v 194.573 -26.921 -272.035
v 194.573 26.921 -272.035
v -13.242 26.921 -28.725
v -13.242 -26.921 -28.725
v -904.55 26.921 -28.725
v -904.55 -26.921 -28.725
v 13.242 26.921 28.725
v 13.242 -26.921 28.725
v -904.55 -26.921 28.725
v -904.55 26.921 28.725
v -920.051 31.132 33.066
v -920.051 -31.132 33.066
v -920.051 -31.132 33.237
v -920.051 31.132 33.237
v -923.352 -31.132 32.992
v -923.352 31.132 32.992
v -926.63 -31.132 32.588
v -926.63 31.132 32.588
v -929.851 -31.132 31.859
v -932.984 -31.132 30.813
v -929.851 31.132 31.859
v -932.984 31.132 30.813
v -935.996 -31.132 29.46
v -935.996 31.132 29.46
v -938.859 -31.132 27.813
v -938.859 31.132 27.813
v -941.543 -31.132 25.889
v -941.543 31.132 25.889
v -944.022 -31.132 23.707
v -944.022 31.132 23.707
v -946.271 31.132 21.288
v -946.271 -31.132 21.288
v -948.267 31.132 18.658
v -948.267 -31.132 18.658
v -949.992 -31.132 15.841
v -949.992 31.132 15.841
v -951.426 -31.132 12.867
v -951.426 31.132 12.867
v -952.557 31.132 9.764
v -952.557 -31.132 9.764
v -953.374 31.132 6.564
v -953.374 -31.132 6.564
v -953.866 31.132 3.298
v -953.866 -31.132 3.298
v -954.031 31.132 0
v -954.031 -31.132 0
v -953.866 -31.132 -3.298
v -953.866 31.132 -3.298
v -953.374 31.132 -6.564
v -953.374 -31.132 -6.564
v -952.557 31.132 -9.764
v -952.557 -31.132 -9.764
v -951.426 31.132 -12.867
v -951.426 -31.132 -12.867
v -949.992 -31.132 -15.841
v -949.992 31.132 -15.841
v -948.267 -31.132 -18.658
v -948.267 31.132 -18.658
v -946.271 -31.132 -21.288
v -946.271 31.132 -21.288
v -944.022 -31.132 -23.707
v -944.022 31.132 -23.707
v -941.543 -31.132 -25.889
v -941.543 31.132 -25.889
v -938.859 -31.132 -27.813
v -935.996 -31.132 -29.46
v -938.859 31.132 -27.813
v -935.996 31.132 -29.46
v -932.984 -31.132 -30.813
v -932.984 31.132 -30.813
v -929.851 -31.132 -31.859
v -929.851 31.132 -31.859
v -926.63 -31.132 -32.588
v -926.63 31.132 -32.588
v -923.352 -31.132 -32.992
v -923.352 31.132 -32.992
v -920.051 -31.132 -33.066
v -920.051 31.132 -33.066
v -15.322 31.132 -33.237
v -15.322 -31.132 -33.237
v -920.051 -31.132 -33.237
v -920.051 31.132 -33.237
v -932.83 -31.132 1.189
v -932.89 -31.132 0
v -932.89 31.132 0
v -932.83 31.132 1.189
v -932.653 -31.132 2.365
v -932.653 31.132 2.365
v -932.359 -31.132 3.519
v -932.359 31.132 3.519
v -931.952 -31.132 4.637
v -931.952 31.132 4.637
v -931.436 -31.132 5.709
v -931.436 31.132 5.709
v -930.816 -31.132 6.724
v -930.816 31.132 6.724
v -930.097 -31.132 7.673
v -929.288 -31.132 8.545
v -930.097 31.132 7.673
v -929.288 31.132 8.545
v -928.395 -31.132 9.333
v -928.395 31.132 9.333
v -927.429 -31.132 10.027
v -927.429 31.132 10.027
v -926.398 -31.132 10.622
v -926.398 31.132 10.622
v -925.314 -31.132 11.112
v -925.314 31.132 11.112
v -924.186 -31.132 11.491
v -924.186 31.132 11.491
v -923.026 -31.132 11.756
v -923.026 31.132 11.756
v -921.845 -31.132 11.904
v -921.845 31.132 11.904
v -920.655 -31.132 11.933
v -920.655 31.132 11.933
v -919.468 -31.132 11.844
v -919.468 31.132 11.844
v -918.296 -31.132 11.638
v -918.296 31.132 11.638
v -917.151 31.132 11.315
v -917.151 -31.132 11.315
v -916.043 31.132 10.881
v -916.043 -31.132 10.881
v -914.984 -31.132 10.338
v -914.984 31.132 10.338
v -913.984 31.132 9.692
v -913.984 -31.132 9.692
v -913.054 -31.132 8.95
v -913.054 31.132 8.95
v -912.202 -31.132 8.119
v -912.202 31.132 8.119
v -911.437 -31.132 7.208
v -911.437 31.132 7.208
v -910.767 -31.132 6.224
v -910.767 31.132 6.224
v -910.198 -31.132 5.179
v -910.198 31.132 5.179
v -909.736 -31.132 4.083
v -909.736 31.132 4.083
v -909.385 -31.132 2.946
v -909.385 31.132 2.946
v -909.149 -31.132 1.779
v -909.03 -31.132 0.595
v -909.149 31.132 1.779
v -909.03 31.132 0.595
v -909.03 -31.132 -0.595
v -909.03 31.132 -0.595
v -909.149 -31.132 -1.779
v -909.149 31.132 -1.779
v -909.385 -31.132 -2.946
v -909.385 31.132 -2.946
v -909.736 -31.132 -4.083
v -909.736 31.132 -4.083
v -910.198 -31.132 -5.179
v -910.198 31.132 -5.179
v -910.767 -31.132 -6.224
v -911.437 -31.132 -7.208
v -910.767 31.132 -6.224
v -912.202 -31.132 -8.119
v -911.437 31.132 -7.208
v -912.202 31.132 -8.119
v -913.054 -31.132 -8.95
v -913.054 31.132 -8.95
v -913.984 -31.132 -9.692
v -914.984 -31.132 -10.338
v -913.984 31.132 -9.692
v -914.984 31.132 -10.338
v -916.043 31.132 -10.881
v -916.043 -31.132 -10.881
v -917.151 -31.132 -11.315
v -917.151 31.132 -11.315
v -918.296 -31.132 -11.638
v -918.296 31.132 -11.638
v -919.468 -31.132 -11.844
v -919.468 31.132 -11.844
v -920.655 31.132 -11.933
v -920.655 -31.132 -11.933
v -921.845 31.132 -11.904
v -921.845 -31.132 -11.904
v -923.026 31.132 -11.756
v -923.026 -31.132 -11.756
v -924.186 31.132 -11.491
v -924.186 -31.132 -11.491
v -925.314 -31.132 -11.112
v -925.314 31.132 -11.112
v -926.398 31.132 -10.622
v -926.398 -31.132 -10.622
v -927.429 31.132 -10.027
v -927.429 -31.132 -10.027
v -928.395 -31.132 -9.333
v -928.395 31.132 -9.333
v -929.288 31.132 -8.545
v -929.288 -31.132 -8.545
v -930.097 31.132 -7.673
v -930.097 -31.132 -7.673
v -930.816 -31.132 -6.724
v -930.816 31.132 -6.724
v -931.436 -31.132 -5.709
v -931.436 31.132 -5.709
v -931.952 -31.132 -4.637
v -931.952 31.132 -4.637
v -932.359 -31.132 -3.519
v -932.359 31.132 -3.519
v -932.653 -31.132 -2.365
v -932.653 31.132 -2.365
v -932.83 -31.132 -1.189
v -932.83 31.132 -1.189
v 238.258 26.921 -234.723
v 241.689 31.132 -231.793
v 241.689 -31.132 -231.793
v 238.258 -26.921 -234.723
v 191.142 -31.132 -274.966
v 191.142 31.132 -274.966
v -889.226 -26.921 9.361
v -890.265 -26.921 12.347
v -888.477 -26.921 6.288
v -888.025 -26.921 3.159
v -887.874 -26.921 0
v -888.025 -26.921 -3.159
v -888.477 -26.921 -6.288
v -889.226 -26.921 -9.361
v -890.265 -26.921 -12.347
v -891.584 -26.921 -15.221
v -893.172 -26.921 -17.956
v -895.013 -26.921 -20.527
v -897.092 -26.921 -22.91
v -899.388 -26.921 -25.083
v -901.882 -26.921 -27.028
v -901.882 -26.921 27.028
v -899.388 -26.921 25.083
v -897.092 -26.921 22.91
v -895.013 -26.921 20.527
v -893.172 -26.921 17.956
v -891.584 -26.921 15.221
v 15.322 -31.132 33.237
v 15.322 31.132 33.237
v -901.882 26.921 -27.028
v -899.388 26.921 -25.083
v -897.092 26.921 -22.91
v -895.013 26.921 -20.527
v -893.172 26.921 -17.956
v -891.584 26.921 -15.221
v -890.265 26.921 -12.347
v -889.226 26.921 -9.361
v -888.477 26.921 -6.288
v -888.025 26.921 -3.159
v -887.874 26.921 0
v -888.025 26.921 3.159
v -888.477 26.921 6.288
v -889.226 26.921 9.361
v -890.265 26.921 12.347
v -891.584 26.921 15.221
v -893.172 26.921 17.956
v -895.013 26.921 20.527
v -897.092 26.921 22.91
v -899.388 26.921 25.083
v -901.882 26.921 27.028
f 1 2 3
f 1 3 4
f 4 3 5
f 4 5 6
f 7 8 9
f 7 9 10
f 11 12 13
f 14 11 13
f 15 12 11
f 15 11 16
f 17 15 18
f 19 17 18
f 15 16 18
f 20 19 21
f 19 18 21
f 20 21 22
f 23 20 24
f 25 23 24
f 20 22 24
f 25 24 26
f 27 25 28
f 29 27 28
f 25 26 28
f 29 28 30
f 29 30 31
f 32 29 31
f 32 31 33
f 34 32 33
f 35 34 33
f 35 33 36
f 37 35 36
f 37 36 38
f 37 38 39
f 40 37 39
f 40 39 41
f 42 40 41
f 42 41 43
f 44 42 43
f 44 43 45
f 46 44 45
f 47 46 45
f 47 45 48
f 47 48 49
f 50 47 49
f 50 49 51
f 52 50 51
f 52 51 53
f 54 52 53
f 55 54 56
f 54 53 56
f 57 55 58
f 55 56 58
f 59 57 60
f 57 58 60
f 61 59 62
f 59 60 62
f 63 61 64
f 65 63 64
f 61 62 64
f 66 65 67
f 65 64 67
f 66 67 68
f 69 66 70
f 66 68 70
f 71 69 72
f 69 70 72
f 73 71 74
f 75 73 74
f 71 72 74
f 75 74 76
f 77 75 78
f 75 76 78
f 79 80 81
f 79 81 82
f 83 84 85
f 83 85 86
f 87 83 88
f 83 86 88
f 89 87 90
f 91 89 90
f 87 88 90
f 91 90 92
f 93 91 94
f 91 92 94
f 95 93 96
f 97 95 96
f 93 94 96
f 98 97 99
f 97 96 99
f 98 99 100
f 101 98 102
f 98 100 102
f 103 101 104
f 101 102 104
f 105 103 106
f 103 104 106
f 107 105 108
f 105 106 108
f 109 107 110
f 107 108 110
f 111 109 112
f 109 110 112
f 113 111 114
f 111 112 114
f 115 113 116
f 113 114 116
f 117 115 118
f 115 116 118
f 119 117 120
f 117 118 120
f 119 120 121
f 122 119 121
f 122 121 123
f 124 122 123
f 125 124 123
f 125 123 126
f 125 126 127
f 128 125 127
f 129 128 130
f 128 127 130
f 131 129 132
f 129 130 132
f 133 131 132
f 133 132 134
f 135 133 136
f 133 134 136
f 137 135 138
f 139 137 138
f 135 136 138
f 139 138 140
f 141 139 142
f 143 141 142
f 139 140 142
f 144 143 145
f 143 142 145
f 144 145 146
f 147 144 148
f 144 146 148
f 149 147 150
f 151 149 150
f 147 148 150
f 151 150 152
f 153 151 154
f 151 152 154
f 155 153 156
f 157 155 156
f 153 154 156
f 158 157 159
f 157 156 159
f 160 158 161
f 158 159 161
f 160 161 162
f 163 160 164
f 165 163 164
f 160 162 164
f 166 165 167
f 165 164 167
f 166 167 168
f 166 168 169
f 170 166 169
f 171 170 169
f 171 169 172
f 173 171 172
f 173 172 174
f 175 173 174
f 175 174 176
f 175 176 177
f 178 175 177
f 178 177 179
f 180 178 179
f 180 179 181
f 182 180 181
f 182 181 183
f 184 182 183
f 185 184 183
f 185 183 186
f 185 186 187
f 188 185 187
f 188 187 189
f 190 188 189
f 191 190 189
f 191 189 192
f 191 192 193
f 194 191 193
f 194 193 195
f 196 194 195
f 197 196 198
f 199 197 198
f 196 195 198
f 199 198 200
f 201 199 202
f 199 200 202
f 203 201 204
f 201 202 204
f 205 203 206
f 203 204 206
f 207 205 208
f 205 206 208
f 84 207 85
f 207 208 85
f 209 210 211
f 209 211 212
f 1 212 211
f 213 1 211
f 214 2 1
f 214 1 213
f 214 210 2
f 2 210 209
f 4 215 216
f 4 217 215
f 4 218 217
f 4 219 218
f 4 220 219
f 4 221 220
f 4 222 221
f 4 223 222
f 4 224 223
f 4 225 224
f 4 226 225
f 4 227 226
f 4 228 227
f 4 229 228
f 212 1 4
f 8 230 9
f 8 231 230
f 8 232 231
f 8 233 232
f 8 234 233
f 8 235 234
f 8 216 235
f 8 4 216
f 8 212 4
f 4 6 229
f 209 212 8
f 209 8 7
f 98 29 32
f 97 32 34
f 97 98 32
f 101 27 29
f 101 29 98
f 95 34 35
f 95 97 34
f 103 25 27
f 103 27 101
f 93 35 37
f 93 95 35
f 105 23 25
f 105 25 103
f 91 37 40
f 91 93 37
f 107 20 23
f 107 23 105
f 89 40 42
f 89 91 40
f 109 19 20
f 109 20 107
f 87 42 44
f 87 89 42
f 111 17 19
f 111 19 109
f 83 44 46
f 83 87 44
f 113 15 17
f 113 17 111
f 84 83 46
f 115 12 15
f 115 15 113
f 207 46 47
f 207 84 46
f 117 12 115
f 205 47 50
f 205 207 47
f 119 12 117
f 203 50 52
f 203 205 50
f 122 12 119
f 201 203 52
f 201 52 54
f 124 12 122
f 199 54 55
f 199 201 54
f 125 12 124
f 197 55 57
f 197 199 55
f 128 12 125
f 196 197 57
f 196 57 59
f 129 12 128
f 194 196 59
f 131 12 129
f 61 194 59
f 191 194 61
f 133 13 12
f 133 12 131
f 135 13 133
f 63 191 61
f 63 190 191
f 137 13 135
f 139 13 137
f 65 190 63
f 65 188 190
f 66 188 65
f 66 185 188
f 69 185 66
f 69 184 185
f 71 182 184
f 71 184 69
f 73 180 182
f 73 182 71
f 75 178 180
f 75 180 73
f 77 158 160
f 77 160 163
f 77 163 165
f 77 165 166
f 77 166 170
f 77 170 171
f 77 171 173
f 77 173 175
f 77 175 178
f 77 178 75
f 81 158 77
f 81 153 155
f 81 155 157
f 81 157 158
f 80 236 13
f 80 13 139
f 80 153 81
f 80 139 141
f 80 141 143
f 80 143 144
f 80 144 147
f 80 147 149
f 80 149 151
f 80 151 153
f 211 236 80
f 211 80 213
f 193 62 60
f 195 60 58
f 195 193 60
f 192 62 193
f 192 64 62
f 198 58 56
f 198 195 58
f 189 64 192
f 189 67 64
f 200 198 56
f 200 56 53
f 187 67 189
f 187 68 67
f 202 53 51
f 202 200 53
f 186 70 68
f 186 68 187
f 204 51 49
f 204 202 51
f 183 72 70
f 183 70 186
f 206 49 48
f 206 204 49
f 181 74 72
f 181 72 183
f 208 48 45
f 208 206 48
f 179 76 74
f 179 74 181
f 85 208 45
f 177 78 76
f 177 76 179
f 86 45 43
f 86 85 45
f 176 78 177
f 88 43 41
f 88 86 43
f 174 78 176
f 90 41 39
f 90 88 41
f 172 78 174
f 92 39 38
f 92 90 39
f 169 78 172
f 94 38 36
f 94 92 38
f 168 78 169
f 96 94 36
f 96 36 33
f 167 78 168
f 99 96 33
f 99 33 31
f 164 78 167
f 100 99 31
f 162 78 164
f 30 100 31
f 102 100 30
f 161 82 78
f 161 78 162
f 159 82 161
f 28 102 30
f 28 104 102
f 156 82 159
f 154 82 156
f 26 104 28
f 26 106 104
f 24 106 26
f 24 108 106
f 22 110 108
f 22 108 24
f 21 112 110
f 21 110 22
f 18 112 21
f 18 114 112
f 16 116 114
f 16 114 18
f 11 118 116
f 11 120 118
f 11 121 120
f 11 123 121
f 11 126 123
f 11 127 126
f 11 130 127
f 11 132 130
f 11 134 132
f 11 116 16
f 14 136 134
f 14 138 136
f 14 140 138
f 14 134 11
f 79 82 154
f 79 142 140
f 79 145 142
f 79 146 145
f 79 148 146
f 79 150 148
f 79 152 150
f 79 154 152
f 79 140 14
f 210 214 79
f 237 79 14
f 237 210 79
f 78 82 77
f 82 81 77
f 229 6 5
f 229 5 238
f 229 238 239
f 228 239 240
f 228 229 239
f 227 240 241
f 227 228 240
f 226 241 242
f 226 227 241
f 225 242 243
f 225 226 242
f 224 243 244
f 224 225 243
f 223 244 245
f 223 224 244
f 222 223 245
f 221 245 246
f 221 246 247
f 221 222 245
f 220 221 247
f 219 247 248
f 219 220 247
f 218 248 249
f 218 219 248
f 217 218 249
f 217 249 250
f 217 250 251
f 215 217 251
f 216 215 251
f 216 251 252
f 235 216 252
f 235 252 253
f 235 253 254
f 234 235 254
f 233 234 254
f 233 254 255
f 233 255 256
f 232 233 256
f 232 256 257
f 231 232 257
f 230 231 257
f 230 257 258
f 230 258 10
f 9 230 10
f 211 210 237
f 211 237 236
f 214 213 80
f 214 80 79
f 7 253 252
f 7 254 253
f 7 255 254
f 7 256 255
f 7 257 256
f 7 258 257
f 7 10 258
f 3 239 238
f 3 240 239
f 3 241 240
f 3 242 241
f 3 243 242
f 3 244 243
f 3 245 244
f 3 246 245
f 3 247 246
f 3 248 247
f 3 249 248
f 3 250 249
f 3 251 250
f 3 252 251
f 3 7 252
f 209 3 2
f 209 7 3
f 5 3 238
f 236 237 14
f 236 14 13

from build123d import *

# Parameters (mm, degrees)
F2_W          = 62.2634254396
F2_H          = 66.4744749665
F2_W_2        = 53.8413152099
F2_H_2        = 57.4507899582
F4_R          = 33.0786713832
F5_DEPTH      = 31.1317127198
F5_DEPTH_BACK = 31.1317127198
F6_R          = 11.9370670554
F7_DEPTH      = 62.2634254396


with BuildPart() as f3:
    # F3: sweep along a path in F0
    with BuildLine(Plane.XZ) as f3_path:
        Line((-920.0506210327, 0), (0, 0))
        Line((0, 0), (216.415554285, -253.3791065216))
    # F2 (on plane+point) → F3 (sweep)
    with BuildSketch(Plane.YZ.offset(-920.0506210327)):
        Rectangle(F2_W, F2_H)
        Rectangle(F2_W_2, F2_H_2, mode=Mode.SUBTRACT)
    sweep(path=f3_path.line, transition=Transition.RIGHT)

    # F4 (on Front) → F5 (join, two sides)
    with BuildSketch(Plane.XZ) as f5_sk:
        with Locations((-920.9526777267, 0)):
            Circle(F4_R)
    extrude(amount=F5_DEPTH)
    extrude(f5_sk.sketch, amount=-F5_DEPTH_BACK)

    # F6 (on face) → F7 (cut, through all)
    with BuildSketch(Plane(origin=(0, 31.1317127198, 0), x_dir=(-1, 0, 0), z_dir=(0, 1, 0))):
        with Locations((920.9526777267, 0)):
            Circle(F6_R)
    extrude(amount=-F7_DEPTH, mode=Mode.SUBTRACT)


solid = f3.part
